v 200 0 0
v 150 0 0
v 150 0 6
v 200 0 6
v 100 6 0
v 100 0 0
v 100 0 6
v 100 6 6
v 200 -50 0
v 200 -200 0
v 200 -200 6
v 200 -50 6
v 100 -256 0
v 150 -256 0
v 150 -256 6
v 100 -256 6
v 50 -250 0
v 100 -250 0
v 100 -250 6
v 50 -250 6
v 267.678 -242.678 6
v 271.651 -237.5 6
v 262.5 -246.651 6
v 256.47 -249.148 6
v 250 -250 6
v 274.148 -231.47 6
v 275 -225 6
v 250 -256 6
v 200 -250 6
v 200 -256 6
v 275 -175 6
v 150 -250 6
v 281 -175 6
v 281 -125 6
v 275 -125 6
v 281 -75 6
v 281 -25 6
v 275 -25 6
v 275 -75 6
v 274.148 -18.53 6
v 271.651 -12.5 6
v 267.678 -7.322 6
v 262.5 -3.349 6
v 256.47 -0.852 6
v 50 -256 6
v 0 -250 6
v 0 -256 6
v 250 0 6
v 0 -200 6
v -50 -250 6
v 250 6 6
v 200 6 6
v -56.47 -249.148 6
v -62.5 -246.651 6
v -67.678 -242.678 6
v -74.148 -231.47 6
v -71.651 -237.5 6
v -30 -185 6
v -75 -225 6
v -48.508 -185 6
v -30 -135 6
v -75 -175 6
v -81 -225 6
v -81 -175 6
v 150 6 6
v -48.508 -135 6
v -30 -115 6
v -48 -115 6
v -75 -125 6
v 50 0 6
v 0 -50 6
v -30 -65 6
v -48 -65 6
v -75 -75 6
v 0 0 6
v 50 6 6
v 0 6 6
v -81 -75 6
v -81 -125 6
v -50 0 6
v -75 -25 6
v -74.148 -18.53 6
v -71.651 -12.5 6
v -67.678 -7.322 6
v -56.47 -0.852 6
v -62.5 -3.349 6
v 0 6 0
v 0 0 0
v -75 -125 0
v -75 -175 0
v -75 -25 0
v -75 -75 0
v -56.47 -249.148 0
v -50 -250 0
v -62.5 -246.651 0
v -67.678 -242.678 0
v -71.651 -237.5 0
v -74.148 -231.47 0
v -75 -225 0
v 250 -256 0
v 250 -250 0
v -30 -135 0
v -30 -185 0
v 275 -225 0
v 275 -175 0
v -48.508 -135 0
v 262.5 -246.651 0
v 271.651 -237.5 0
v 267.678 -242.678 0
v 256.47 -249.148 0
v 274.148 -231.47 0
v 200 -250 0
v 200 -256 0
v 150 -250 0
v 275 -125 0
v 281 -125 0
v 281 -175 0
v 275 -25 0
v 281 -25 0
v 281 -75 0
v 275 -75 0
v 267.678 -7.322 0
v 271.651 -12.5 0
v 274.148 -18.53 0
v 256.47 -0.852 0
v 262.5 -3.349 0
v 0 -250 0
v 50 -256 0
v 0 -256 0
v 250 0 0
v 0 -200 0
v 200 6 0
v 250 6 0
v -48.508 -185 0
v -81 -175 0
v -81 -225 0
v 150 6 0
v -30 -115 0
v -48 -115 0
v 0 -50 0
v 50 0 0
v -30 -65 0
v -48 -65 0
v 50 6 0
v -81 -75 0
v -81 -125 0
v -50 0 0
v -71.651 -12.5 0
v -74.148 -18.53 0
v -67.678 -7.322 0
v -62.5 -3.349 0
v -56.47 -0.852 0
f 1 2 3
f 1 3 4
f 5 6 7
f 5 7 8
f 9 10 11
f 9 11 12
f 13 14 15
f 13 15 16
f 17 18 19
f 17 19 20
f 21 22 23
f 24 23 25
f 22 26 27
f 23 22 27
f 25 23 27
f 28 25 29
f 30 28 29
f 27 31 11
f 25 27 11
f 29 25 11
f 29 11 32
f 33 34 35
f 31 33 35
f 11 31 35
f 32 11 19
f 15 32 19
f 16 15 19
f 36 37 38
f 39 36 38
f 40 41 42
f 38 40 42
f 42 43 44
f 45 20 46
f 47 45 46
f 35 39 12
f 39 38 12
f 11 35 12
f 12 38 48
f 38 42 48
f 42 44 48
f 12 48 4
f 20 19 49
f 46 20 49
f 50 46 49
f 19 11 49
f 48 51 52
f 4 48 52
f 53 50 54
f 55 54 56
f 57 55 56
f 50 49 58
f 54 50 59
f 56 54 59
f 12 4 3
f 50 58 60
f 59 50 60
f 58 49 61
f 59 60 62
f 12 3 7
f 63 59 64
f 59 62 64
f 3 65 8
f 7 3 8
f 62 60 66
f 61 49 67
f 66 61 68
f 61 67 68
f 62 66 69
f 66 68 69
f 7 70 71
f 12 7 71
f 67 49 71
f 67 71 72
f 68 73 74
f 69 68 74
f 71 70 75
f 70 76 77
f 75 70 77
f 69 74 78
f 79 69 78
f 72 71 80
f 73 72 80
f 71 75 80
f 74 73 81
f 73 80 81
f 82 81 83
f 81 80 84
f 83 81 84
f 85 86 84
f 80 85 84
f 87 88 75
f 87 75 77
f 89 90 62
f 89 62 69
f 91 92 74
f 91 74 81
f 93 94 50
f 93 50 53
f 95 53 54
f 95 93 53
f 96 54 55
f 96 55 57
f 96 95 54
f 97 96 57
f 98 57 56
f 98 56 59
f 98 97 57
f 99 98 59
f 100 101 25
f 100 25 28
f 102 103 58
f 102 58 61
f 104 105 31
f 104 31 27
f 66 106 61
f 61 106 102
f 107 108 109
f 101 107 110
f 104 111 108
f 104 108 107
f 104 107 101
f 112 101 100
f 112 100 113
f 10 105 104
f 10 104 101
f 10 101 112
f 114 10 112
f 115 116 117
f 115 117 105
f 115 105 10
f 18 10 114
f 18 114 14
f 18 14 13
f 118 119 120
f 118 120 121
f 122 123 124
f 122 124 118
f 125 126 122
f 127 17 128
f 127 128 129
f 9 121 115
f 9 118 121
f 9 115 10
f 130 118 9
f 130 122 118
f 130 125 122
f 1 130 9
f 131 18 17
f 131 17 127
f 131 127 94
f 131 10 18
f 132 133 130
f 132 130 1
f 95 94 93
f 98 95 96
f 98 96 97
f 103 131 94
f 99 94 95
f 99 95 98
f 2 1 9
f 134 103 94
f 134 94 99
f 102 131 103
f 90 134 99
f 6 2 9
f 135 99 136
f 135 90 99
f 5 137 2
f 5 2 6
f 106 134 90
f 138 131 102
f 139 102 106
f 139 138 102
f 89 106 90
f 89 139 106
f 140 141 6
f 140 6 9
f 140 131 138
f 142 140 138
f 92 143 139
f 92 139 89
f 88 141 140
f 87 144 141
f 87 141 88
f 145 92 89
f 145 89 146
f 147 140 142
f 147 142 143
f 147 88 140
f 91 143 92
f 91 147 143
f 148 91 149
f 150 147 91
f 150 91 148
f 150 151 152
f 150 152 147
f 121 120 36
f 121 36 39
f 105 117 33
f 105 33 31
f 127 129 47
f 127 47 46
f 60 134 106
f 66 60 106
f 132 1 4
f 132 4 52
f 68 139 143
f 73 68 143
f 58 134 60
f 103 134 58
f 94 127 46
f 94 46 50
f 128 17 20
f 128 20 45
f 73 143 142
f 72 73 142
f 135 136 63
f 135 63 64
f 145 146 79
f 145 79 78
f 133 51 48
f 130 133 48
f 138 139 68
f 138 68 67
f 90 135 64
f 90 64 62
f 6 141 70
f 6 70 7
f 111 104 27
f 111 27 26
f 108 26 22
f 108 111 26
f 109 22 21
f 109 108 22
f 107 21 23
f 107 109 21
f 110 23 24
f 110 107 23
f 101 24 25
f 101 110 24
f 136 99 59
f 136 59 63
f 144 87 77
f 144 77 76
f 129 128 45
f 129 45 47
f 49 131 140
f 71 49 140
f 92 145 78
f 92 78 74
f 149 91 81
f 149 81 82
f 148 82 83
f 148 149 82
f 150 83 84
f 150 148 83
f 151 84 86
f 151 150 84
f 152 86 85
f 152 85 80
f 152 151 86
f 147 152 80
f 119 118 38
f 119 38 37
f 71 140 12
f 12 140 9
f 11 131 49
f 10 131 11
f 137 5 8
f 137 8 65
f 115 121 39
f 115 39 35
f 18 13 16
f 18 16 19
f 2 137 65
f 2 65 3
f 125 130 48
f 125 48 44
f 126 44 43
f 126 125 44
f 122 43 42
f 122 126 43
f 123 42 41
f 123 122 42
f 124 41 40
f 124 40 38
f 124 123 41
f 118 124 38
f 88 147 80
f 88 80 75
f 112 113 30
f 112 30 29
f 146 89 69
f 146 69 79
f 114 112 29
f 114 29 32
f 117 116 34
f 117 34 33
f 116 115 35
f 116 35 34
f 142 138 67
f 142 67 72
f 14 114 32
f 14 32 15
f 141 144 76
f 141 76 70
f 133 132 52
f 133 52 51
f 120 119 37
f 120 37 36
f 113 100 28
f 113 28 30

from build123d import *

# Parameters (mm, degrees)
ESQUISSE1_W        = 200
ESQUISSE1_H        = 150
ESQUISSE1_W_2      = 18
ESQUISSE1_H_2      = 50
ESQUISSE1_W_3      = 18.507782823
BOSS_EXTRU_1_DEPTH = 6


with BuildPart() as part:
    # Esquisse1 → Boss.-Extru.1 (new body)
    with BuildSketch(Plane.XY):
        with BuildLine():
            Line((0, 0), (0, 6))
            Line((0, 6), (50, 6))
            Line((50, 6), (50, 0))
            Line((50, 0), (100, 0))
            Line((100, 0), (100, 6))
            Line((100, 6), (150, 6))
            Line((150, 6), (150, 0))
            Line((150, 0), (200, 0))
            Line((200, 0), (200, 6))
            Line((200, 6), (250, 6))
            Line((250, 6), (250, 0))
            ThreePointArc((250, 0), (267.67766953, -7.32233047), (275, -25))
            Line((275, -25), (281, -25))
            Line((281, -25), (281, -75))
            Line((281, -75), (275, -75))
            Line((275, -75), (275, -125))
            Line((275, -125), (281, -125))
            Line((281, -125), (281, -175))
            Line((281, -175), (275, -175))
            Line((275, -175), (275, -225))
            ThreePointArc((275, -225), (267.67766953, -242.67766953), (250, -250))
            Line((250, -250), (250, -256))
            Line((250, -256), (200, -256))
            Line((200, -256), (200, -250))
            Line((200, -250), (150, -250))
            Line((150, -250), (150, -256))
            Line((150, -256), (100, -256))
            Line((100, -256), (100, -250))
            Line((100, -250), (50, -250))
            Line((50, -250), (50, -256))
            Line((50, -256), (0, -256))
            Line((0, -256), (0, -250))
            Line((0, -250), (-50, -250))
            ThreePointArc((-50, -250), (-67.67766953, -242.67766953), (-75, -225))
            Line((-75, -225), (-81, -225))
            Line((-81, -225), (-81, -175))
            Line((-81, -175), (-75, -175))
            Line((-75, -175), (-75, -125))
            Line((-75, -125), (-81, -125))
            Line((-81, -125), (-81, -75))
            Line((-81, -75), (-75, -75))
            Line((-75, -75), (-75, -25))
            ThreePointArc((-75, -25), (-67.67766953, -7.32233047), (-50, 0))
            Line((-50, 0), (0, 0))
        make_face()
        with Locations((100, -125)):
            Rectangle(ESQUISSE1_W, ESQUISSE1_H, mode=Mode.SUBTRACT)
        with Locations((-39, -90)):
            Rectangle(ESQUISSE1_W_2, ESQUISSE1_H_2, mode=Mode.SUBTRACT)
        with Locations((-39.253891412, -160)):
            Rectangle(ESQUISSE1_W_3, ESQUISSE1_H_2, mode=Mode.SUBTRACT)
    extrude(amount=BOSS_EXTRU_1_DEPTH)


solid = part.part
